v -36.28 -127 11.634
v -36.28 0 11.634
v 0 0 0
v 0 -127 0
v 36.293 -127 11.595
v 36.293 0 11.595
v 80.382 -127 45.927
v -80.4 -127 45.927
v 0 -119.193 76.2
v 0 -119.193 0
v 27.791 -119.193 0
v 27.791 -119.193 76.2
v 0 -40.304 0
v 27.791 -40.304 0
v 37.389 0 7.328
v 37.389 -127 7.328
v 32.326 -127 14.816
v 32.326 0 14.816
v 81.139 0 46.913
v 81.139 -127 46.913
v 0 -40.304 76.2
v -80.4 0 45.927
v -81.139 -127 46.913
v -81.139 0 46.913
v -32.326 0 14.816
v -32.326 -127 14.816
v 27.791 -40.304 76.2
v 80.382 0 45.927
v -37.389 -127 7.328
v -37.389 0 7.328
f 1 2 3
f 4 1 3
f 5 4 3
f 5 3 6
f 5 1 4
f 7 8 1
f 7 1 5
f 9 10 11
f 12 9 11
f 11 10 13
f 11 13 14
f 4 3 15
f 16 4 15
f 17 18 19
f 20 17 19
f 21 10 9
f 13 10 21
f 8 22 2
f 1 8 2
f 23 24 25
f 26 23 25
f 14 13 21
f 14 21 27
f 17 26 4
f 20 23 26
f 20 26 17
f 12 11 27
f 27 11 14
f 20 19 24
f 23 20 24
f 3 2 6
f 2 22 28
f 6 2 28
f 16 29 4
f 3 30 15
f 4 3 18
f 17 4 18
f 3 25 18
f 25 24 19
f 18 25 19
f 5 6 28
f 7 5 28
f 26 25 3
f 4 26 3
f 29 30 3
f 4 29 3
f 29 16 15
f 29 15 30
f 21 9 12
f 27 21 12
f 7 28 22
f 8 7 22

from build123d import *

# Parameters (mm, degrees)
F3_DEPTH = 127
F4_W     = 27.7905929834
F4_H     = 78.8894183934
F5_DEPTH = 76.2


with BuildPart() as f3:
    # F0 (on Front) → F3 (new body)
    with BuildSketch(Plane.XZ):
        Polygon((-37.3886082215, 7.3281631574), (0, 0), (37.388604509, 7.3281631574), align=None)
    extrude(amount=F3_DEPTH)


with BuildPart() as f3b:
    # F1 (on Front) → F3, piece 2 (new body)
    with BuildSketch(Plane.XZ):
        Polygon((-36.2803565689, 11.6338182567), (0, 0), (36.2926745631, 11.595334107), (80.3821684599, 45.9274026134), (-80.3997907445, 45.9274026134), align=None)
    extrude(amount=F3_DEPTH)


with BuildPart() as f3c:
    # F2 (on Front) → F3, piece 3 (new body)
    with BuildSketch(Plane.XZ):
        Polygon((-32.3263696832, 14.8161878736), (0, 0), (32.3263696832, 14.8161878736), align=None)
        Polygon((-81.1394575293, 46.9125872811), (-32.3263696832, 14.8161878736), (32.3263696832, 14.8161878736), (81.1394575293, 46.9125872811), align=None)
    extrude(amount=F3_DEPTH)


with BuildPart() as f5:
    # F4 (on Top) → F5 (new body)
    with BuildSketch(Plane.XY):
        with Locations((13.8952964917, -79.7485318035)):
            Rectangle(F4_W, F4_H)
    extrude(amount=F5_DEPTH)


solid = Compound([f3.part, f3b.part, f3c.part, f5.part])
